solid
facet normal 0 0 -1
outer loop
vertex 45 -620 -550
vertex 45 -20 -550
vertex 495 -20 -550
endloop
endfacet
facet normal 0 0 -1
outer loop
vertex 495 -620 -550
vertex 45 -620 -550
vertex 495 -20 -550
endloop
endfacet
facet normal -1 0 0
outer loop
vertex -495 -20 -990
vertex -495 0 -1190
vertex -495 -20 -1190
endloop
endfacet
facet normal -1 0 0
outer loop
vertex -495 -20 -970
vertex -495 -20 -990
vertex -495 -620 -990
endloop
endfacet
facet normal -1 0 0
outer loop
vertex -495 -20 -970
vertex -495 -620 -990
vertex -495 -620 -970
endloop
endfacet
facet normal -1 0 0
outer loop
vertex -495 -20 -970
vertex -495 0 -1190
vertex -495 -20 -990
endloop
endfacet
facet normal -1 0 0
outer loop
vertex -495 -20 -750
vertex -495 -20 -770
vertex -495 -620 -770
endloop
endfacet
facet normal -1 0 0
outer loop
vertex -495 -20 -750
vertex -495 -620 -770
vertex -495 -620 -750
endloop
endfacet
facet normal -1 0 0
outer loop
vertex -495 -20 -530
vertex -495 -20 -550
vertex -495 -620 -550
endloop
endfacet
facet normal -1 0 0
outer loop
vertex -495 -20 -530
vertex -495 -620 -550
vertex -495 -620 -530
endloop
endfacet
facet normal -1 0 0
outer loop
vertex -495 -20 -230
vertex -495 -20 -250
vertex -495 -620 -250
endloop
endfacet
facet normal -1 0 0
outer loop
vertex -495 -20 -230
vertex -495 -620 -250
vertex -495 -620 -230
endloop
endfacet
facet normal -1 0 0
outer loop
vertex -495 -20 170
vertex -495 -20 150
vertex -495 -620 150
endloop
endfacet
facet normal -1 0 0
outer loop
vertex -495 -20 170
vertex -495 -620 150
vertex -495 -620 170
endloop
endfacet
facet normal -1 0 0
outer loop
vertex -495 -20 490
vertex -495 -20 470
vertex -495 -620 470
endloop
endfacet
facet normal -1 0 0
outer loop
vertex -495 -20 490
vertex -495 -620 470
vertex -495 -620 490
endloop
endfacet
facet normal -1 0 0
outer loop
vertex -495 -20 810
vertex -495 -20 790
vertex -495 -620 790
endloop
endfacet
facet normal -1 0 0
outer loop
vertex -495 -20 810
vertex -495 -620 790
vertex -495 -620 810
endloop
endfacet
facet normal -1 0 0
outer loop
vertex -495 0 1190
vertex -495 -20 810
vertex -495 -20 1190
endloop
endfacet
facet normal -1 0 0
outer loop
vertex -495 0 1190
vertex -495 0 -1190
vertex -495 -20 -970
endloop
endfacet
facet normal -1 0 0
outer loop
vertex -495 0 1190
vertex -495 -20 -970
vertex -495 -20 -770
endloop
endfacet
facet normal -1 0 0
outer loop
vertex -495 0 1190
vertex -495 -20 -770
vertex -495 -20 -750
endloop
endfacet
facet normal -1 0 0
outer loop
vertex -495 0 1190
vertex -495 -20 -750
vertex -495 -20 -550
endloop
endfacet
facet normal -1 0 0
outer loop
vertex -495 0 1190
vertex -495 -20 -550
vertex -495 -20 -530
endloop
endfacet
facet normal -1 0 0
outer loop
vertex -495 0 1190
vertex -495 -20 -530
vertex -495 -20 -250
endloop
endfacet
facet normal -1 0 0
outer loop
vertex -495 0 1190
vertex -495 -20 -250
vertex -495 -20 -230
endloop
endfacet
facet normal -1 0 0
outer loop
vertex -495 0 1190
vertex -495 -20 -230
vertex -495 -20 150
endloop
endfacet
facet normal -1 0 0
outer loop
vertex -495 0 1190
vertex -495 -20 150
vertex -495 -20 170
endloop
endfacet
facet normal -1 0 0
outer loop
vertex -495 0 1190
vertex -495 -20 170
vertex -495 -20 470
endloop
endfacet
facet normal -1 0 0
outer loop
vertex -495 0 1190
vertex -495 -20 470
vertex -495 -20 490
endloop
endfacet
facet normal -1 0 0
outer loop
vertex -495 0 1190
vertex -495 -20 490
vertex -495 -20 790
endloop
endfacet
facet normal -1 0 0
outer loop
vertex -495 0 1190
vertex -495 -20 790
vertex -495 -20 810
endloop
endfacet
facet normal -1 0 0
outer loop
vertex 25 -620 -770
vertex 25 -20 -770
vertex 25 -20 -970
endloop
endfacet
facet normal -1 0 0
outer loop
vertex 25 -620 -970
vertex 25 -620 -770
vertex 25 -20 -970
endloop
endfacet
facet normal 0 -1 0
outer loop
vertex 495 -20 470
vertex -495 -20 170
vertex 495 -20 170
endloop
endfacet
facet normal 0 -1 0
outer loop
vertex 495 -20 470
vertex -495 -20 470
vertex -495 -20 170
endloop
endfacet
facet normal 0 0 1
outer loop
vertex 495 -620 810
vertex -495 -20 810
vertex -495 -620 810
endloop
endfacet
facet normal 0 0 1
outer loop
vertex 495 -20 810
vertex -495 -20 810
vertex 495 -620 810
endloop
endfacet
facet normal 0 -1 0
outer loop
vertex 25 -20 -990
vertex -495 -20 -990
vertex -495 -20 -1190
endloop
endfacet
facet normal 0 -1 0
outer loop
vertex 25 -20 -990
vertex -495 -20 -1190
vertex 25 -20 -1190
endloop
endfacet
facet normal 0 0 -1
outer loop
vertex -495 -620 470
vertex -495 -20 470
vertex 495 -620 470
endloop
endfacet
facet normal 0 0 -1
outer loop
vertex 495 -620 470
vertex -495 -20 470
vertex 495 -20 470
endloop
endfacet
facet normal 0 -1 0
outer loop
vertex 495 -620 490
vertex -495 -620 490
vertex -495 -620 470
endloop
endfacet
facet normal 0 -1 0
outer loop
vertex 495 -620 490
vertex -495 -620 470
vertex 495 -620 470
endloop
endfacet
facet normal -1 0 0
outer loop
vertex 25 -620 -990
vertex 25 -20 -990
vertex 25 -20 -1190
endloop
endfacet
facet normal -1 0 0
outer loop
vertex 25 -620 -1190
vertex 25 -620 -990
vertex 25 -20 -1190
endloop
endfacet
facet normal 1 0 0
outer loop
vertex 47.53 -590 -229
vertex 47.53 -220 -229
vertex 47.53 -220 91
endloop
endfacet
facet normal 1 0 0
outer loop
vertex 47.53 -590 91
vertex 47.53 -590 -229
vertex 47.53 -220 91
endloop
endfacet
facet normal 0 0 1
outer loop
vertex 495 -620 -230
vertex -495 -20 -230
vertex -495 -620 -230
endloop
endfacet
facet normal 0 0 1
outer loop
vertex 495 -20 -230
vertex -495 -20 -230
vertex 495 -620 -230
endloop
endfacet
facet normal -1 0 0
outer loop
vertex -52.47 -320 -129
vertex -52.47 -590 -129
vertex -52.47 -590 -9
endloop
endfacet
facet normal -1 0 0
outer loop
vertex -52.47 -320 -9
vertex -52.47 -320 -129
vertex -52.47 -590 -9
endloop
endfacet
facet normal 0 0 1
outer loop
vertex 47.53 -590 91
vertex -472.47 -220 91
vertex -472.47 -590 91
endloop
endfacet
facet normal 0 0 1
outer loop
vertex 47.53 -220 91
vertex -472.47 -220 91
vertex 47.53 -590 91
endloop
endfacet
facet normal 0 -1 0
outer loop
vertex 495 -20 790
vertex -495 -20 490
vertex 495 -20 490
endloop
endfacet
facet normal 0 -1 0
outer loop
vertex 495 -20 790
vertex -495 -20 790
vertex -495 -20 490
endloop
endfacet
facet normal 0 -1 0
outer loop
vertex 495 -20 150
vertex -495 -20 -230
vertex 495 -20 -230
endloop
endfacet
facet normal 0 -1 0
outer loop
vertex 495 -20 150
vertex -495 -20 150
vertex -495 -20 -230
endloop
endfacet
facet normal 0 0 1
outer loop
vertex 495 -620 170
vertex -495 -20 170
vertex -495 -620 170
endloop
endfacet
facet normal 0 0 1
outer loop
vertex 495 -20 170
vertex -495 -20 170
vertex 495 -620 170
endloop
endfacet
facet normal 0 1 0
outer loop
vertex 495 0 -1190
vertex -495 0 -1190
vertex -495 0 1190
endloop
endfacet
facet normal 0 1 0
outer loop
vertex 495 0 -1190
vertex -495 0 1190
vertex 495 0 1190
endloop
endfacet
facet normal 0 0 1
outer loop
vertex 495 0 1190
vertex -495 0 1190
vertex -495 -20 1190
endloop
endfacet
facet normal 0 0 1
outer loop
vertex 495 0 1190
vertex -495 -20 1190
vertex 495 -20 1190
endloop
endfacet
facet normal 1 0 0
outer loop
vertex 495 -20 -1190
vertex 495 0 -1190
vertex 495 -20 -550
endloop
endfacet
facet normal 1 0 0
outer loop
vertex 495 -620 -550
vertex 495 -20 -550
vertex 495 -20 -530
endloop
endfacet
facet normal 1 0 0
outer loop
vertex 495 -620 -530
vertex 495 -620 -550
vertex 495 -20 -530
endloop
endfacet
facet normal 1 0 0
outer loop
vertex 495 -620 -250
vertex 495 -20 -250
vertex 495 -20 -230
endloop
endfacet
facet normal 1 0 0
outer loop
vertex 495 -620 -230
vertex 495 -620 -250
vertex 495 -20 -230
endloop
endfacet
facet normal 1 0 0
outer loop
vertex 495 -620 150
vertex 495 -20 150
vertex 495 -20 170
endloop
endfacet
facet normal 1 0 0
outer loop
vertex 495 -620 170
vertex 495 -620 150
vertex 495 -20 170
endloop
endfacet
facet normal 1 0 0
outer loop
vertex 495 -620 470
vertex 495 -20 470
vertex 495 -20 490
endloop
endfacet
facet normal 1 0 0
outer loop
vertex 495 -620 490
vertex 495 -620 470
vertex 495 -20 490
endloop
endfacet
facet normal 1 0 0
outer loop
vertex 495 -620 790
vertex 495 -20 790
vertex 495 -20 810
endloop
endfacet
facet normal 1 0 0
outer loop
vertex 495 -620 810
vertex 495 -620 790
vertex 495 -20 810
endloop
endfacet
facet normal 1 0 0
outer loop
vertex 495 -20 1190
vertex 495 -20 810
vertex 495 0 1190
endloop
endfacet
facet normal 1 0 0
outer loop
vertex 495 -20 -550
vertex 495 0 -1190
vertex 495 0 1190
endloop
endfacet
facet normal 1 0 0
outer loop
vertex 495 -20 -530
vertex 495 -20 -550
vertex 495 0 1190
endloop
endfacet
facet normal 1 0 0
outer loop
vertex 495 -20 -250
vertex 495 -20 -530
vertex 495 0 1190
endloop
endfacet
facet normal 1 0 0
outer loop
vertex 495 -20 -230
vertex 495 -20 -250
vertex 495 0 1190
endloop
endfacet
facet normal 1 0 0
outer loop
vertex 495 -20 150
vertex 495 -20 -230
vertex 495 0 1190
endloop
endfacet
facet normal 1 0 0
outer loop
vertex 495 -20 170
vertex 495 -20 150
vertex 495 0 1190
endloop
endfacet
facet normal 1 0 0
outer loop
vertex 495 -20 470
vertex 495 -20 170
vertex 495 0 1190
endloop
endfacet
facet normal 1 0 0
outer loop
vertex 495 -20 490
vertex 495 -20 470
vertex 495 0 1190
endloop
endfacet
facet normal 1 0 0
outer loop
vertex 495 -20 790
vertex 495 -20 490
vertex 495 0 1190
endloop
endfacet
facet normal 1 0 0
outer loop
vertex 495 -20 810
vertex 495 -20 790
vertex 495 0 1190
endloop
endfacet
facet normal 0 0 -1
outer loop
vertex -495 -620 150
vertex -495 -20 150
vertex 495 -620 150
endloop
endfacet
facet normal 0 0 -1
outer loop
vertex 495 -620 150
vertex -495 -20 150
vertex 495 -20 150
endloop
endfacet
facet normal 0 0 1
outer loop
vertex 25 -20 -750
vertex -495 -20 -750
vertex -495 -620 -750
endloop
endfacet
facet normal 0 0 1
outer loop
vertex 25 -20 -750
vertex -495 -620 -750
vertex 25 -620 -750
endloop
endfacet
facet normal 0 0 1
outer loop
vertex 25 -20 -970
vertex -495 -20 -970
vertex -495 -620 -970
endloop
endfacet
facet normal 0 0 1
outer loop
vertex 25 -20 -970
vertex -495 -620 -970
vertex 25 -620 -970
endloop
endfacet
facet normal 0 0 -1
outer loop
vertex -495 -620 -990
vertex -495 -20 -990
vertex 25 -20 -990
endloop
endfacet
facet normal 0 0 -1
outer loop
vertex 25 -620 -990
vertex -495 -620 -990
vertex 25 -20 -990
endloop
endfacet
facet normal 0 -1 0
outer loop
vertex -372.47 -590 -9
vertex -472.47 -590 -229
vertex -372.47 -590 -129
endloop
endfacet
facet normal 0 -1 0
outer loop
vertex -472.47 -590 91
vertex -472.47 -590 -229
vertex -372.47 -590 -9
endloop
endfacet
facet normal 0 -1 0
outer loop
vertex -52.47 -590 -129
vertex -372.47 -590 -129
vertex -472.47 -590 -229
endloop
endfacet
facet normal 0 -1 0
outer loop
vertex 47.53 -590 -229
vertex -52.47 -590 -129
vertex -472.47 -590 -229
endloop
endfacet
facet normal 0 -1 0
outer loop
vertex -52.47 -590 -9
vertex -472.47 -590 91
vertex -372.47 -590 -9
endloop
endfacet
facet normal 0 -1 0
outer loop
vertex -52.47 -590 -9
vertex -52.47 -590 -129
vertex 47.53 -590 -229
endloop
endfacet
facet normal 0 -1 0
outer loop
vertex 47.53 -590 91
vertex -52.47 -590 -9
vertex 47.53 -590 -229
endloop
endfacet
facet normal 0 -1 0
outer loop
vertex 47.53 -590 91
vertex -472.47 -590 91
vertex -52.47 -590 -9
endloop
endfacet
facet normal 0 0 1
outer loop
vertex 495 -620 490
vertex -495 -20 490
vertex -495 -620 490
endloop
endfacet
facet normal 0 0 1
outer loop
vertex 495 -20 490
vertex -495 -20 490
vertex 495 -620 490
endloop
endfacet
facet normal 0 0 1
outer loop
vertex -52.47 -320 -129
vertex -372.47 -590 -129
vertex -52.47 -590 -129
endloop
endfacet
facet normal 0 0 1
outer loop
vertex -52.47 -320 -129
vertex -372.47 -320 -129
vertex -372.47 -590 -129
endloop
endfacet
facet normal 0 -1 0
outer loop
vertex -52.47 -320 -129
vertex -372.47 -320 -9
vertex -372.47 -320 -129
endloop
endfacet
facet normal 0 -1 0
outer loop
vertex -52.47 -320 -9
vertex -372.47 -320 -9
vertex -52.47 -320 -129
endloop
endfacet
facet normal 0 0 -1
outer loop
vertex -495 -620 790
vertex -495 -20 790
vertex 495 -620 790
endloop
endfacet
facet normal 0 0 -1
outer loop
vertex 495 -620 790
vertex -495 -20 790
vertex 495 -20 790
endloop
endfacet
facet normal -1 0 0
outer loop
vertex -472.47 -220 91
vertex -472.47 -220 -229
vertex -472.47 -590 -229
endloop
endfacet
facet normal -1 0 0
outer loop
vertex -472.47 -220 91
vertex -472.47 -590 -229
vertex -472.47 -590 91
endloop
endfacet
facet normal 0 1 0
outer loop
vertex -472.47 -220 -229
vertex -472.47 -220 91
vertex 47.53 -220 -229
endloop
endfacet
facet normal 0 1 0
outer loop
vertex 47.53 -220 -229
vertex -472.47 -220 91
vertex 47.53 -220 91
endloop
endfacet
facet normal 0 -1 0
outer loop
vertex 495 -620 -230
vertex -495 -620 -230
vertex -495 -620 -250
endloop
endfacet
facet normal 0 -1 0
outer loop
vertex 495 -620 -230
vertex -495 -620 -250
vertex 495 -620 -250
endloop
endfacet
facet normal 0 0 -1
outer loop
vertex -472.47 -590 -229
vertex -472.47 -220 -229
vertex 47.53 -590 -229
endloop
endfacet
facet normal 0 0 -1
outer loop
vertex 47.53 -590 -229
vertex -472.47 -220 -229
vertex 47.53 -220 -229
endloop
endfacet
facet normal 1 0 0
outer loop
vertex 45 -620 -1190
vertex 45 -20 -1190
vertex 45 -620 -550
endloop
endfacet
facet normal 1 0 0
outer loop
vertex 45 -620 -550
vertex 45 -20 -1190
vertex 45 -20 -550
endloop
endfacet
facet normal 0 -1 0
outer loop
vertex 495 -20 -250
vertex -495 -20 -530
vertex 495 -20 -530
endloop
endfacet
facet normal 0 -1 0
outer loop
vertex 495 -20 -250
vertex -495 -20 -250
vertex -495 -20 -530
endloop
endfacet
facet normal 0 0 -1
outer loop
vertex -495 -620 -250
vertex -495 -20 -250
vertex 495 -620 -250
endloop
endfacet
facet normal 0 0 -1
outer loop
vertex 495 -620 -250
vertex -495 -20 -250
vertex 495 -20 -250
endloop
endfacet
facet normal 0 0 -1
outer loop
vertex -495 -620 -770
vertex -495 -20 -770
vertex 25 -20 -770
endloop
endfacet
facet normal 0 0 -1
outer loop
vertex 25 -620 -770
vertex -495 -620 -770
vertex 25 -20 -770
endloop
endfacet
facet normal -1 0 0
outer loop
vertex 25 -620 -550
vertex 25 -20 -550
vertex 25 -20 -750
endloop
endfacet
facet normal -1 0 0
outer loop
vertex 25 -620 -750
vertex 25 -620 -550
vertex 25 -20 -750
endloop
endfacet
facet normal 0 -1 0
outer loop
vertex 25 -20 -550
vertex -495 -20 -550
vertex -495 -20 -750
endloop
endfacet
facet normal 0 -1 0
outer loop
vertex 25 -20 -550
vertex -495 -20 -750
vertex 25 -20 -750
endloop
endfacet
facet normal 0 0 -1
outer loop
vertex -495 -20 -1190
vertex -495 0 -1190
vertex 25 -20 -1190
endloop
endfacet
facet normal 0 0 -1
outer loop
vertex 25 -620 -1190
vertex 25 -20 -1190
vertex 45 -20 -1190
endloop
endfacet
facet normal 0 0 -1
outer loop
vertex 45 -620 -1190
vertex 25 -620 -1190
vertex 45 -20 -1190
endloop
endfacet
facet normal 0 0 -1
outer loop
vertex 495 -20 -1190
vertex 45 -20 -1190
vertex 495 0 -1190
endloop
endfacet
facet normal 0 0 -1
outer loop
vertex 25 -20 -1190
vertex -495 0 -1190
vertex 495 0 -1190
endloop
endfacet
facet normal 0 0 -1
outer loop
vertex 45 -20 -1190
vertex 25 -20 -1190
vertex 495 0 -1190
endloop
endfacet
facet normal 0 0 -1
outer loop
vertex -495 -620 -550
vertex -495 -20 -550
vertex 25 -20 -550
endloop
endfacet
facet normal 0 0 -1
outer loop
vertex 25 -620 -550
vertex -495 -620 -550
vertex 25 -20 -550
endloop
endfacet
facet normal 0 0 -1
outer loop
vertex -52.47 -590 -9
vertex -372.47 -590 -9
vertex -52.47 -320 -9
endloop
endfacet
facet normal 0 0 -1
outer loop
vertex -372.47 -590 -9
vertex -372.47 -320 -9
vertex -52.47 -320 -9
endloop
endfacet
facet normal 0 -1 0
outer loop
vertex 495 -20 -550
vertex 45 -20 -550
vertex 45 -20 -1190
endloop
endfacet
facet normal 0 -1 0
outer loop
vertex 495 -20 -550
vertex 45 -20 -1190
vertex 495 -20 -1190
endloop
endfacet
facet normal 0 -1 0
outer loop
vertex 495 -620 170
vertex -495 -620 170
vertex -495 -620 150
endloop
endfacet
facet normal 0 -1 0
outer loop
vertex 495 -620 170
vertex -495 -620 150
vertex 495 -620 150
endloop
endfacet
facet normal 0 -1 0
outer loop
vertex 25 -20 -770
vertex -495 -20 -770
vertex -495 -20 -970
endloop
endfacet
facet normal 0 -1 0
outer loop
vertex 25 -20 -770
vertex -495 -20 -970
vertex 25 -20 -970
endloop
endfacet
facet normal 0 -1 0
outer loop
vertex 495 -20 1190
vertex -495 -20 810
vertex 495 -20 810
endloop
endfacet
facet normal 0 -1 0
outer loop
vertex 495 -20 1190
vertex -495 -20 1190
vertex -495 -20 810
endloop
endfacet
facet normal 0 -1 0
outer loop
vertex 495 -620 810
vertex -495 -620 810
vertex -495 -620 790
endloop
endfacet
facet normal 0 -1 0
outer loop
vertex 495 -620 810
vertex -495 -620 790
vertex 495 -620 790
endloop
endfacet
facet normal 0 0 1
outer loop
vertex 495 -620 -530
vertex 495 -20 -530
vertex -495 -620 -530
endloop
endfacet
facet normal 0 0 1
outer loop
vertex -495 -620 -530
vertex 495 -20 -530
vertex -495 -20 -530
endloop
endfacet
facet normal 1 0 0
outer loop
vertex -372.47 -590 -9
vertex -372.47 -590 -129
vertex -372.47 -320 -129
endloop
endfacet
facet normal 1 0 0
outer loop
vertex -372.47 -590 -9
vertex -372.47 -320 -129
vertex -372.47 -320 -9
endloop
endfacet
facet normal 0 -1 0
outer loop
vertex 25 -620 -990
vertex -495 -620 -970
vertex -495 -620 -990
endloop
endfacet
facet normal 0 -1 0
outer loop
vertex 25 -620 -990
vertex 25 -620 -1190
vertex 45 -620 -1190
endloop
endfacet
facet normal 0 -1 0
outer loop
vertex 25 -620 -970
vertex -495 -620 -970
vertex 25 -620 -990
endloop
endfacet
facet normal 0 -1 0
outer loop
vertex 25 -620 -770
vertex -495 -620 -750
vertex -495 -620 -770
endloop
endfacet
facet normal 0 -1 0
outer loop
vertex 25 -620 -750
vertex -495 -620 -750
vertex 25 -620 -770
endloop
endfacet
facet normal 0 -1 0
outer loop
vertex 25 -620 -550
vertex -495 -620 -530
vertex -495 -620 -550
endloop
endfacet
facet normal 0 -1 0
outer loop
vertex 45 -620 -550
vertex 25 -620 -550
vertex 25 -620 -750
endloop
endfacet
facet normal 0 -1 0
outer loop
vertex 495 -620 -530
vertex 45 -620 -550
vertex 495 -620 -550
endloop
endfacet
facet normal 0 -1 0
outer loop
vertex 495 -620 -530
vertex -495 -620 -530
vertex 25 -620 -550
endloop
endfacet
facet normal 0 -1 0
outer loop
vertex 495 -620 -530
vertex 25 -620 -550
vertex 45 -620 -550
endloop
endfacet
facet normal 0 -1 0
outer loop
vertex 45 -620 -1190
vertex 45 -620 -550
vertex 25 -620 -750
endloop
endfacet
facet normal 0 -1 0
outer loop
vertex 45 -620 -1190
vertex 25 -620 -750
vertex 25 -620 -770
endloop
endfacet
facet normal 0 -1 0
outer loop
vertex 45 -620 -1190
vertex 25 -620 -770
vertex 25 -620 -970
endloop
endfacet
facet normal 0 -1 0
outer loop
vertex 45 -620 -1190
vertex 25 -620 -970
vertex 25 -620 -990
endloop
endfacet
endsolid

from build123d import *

# Parameters (mm, degrees)
F0_W     = 990
F0_H     = 2380
F1_DEPTH = 20
F2_W     = 520
F2_H     = 20
F2_W_2   = 990
F3_DEPTH = 600
F5_W     = 520
F5_H     = 320
F6_DEPTH = 370
F7_T     = -100


with BuildPart() as f1:
    # F0 (on Front) → F1 (new body)
    with BuildSketch(Plane.XZ):
        Rectangle(F0_W, F0_H)
    extrude(amount=F1_DEPTH)

    # F2 (on face) → F3 (join)
    with BuildSketch(Plane.XZ.offset(20)):
        Polygon((495, -530), (-495, -530), (-495, -550), (25, -550), (45, -550), (495, -550), align=None)
        Polygon((45, -550), (25, -550), (25, -750), (25, -770), (25, -970), (25, -990), (25, -1190), (45, -1190), align=None)
        with Locations((-235, -760)):
            Rectangle(F2_W, F2_H)
        with Locations((-235, -980)):
            Rectangle(F2_W, F2_H)
        with Locations((0, -240)):
            Rectangle(F2_W_2, F2_H)
        with Locations((0, 160)):
            Rectangle(F2_W_2, F2_H)
        with Locations((0, 480)):
            Rectangle(F2_W_2, F2_H)
        with Locations((0, 800)):
            Rectangle(F2_W_2, F2_H)
    extrude(amount=F3_DEPTH)


with BuildPart() as f6:
    # F5 (on offset) → F6 (new body)
    with BuildSketch(Plane.XZ.offset(220)):
        with Locations((-212.4700854719, -69)):
            Rectangle(F5_W, F5_H)
    extrude(amount=F6_DEPTH)

    # F7
    f7_openings = [f6.faces().sort_by_distance(p)[0] for p in [
        (-212.470085, -590, -69),
    ]]
    offset(amount=F7_T, openings=f7_openings)


solid = Compound([f1.part, f6.part])
